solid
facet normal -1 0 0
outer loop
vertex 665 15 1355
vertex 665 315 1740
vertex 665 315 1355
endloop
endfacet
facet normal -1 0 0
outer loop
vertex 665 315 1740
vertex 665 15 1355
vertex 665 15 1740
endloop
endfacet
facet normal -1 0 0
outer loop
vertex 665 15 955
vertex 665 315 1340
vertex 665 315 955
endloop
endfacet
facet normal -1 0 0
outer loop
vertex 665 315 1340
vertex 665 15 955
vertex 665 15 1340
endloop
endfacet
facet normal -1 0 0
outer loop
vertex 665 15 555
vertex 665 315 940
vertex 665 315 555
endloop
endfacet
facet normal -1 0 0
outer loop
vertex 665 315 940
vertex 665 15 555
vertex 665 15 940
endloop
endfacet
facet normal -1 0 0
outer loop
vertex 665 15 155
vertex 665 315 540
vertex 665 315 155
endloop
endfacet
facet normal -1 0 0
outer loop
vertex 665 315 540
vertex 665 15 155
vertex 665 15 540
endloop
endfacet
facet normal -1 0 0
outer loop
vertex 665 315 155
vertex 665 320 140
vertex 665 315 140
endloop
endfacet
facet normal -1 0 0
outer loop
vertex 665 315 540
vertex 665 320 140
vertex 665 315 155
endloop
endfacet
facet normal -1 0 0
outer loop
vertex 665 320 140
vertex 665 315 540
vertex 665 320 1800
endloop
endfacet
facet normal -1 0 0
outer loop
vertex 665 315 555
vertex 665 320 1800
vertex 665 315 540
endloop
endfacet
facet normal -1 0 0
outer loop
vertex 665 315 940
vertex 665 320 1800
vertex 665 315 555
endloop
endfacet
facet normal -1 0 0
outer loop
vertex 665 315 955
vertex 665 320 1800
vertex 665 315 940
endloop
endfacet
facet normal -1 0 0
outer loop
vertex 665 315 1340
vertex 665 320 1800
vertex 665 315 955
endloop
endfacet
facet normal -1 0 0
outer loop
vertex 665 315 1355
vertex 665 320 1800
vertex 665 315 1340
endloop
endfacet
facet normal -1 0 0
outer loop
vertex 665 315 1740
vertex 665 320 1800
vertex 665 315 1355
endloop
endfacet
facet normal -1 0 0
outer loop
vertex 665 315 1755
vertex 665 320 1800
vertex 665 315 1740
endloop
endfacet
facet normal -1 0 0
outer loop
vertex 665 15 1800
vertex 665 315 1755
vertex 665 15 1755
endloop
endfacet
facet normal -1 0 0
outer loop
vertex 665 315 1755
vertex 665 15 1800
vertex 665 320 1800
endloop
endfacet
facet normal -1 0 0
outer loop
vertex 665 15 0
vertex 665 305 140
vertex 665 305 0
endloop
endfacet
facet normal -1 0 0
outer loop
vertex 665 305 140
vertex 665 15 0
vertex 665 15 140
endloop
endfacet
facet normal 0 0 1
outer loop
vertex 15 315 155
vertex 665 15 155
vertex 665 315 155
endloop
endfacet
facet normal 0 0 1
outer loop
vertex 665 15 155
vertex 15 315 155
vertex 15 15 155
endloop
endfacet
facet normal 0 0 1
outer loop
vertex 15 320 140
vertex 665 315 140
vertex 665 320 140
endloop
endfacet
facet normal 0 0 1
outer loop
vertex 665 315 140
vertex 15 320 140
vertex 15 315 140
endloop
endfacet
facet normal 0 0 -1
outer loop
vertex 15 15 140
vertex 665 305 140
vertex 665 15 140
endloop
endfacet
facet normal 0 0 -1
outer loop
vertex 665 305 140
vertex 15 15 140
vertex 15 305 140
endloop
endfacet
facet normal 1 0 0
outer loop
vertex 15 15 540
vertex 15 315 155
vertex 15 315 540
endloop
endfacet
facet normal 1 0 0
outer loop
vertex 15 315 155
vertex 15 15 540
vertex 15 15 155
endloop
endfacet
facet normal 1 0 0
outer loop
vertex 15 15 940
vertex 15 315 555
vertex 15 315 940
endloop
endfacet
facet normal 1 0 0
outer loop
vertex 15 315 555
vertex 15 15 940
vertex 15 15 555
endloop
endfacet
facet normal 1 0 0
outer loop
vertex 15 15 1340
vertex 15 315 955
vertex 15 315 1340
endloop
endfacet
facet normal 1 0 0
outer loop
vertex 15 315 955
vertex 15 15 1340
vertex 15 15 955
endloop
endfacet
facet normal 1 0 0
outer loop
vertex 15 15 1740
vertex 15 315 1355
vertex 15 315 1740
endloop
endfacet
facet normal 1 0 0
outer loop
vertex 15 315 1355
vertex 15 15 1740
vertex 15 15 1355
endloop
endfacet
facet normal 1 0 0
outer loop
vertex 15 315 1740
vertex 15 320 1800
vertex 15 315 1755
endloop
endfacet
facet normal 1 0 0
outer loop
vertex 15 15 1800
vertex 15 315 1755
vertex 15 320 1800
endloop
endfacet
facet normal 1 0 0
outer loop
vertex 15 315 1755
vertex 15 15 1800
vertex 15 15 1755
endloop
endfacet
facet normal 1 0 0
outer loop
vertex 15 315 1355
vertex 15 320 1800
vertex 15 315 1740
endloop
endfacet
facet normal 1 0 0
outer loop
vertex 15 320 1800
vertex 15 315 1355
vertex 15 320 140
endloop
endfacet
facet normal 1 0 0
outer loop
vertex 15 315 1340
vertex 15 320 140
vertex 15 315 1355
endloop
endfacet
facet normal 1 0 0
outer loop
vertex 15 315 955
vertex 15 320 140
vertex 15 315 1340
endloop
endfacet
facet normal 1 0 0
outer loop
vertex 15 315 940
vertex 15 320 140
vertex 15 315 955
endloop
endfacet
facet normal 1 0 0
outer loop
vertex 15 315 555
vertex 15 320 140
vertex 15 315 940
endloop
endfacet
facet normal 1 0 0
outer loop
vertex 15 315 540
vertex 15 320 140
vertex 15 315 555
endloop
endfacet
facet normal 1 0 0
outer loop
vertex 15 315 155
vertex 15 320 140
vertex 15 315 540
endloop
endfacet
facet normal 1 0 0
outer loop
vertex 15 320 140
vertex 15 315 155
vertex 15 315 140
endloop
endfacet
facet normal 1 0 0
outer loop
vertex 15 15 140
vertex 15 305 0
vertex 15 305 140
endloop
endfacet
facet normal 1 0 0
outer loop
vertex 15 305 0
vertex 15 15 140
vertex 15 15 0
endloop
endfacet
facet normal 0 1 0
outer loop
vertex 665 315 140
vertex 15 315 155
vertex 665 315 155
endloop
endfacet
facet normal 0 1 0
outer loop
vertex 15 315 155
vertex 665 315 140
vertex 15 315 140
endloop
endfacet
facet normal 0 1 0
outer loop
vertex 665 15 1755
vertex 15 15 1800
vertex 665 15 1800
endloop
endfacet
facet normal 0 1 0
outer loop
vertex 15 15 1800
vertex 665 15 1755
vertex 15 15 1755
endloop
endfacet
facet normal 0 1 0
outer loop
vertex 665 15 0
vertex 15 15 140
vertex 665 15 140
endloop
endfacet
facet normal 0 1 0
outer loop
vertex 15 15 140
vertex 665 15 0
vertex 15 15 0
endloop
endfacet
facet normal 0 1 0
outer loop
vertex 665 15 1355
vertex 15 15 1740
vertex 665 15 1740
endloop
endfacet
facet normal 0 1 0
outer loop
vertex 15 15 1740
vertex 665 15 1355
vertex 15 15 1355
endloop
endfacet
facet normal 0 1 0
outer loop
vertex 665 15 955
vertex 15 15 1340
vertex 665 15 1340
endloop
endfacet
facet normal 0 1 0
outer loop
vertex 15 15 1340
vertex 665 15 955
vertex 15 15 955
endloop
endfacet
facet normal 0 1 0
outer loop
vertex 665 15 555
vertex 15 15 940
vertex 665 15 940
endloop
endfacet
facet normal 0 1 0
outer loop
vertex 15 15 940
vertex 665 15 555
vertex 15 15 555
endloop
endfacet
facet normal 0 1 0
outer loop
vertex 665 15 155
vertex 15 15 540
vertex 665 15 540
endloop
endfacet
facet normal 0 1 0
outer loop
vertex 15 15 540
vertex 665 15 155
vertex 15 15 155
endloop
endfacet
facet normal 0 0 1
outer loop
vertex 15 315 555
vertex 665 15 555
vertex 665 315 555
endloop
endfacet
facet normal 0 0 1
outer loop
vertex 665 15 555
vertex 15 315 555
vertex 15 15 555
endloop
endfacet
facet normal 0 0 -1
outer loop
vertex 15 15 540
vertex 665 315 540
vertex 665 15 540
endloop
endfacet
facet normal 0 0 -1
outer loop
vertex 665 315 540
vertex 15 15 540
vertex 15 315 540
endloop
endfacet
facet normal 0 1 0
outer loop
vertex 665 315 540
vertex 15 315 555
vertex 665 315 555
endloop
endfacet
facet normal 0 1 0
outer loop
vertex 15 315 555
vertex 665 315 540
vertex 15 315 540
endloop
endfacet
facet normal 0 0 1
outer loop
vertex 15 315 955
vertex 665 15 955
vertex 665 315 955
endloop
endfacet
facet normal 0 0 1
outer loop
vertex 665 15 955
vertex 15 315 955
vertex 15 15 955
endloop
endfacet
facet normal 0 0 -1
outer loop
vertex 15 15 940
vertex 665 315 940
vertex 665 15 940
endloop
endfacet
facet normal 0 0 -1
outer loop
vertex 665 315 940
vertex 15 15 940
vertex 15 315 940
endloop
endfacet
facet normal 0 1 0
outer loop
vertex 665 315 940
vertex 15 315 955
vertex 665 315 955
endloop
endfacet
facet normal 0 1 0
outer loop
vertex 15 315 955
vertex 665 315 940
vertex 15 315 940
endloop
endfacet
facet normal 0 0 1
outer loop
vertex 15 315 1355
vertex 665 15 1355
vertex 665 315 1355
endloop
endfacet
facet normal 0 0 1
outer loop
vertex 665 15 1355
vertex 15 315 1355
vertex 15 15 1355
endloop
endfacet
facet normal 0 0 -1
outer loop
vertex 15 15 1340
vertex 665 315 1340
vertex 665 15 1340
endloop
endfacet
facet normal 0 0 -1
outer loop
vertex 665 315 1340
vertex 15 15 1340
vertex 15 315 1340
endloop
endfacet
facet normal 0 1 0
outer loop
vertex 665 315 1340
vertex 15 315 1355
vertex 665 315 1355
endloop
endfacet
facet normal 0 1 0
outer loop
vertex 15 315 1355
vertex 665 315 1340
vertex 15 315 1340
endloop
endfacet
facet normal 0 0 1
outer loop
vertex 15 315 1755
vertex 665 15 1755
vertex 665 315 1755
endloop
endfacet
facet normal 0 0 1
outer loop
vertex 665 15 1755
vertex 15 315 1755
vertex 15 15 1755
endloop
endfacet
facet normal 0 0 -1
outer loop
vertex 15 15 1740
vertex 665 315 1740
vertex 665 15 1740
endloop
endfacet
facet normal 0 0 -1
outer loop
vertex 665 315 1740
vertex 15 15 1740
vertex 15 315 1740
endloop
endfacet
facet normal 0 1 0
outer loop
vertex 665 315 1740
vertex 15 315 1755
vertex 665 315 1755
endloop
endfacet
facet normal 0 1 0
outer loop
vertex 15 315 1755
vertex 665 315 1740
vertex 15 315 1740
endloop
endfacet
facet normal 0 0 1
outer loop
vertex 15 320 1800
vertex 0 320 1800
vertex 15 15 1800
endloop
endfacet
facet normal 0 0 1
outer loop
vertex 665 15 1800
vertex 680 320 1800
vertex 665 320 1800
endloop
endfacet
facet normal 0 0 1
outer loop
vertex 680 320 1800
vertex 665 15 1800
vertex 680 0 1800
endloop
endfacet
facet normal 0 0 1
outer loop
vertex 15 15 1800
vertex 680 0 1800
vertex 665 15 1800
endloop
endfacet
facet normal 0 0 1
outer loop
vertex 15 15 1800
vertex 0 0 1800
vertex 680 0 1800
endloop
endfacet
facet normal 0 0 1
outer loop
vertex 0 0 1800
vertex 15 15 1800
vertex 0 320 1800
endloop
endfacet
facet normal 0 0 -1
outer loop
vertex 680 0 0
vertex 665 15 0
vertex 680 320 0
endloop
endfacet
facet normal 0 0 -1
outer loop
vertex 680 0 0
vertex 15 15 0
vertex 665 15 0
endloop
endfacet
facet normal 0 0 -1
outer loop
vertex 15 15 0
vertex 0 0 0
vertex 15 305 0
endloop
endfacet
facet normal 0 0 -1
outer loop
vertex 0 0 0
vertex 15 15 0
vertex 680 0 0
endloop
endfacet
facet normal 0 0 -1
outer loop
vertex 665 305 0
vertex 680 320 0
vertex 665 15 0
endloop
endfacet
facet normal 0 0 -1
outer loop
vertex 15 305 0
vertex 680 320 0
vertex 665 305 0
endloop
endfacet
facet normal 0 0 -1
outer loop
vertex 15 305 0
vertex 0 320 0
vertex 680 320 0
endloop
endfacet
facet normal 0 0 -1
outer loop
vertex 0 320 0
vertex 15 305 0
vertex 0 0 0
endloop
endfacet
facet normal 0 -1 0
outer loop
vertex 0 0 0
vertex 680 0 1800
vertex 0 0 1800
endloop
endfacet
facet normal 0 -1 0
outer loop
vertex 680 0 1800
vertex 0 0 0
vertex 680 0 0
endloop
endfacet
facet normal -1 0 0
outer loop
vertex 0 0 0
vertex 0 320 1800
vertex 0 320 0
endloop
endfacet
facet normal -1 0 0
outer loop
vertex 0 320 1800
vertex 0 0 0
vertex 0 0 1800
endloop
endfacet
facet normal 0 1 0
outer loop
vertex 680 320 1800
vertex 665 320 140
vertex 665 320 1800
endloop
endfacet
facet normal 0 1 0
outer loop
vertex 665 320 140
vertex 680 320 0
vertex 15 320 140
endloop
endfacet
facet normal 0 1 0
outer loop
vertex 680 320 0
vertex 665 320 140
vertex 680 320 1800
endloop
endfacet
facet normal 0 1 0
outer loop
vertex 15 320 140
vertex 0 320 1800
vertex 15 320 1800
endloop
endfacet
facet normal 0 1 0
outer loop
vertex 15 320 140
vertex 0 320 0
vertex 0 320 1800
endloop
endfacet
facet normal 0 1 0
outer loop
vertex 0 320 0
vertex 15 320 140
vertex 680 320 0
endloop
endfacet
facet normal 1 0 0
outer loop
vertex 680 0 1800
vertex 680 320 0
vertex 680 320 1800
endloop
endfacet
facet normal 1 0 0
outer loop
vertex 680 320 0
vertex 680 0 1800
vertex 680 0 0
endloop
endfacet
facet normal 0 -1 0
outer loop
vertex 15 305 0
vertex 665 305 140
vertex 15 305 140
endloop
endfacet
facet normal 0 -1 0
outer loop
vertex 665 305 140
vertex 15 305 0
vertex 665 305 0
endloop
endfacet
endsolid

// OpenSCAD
step = 400;
thickness = 15;
total_side = 320;
total_width = 650;
total_height = 1800;
height_kickplate = 140;

module Side(x) {
 translate([x, 0, 0]) {
  cube([ thickness
       , total_side
       , total_height], false);
 }
}

module Back() {
 translate([thickness, 0, 0]) {
  cube([ total_width
       , thickness
       , total_height], false);
 }
}

module Shelf(z) {
 side = 300;
 translate([ thickness
           , thickness
           , z]) {
  cube([ total_width
       , side
       , thickness], false);
 }
}

module Kickplate() {
 translate([ thickness
           , total_side - thickness
           , 0]) {
  cube([ total_width
       , thickness
       , height_kickplate], false);
 }
}

Back();
#Side(0);
#Side(650 + thickness);
#Kickplate();

for (k = [ height_kickplate
         : step
         : total_height
         ]) {
 Shelf(k);
}
